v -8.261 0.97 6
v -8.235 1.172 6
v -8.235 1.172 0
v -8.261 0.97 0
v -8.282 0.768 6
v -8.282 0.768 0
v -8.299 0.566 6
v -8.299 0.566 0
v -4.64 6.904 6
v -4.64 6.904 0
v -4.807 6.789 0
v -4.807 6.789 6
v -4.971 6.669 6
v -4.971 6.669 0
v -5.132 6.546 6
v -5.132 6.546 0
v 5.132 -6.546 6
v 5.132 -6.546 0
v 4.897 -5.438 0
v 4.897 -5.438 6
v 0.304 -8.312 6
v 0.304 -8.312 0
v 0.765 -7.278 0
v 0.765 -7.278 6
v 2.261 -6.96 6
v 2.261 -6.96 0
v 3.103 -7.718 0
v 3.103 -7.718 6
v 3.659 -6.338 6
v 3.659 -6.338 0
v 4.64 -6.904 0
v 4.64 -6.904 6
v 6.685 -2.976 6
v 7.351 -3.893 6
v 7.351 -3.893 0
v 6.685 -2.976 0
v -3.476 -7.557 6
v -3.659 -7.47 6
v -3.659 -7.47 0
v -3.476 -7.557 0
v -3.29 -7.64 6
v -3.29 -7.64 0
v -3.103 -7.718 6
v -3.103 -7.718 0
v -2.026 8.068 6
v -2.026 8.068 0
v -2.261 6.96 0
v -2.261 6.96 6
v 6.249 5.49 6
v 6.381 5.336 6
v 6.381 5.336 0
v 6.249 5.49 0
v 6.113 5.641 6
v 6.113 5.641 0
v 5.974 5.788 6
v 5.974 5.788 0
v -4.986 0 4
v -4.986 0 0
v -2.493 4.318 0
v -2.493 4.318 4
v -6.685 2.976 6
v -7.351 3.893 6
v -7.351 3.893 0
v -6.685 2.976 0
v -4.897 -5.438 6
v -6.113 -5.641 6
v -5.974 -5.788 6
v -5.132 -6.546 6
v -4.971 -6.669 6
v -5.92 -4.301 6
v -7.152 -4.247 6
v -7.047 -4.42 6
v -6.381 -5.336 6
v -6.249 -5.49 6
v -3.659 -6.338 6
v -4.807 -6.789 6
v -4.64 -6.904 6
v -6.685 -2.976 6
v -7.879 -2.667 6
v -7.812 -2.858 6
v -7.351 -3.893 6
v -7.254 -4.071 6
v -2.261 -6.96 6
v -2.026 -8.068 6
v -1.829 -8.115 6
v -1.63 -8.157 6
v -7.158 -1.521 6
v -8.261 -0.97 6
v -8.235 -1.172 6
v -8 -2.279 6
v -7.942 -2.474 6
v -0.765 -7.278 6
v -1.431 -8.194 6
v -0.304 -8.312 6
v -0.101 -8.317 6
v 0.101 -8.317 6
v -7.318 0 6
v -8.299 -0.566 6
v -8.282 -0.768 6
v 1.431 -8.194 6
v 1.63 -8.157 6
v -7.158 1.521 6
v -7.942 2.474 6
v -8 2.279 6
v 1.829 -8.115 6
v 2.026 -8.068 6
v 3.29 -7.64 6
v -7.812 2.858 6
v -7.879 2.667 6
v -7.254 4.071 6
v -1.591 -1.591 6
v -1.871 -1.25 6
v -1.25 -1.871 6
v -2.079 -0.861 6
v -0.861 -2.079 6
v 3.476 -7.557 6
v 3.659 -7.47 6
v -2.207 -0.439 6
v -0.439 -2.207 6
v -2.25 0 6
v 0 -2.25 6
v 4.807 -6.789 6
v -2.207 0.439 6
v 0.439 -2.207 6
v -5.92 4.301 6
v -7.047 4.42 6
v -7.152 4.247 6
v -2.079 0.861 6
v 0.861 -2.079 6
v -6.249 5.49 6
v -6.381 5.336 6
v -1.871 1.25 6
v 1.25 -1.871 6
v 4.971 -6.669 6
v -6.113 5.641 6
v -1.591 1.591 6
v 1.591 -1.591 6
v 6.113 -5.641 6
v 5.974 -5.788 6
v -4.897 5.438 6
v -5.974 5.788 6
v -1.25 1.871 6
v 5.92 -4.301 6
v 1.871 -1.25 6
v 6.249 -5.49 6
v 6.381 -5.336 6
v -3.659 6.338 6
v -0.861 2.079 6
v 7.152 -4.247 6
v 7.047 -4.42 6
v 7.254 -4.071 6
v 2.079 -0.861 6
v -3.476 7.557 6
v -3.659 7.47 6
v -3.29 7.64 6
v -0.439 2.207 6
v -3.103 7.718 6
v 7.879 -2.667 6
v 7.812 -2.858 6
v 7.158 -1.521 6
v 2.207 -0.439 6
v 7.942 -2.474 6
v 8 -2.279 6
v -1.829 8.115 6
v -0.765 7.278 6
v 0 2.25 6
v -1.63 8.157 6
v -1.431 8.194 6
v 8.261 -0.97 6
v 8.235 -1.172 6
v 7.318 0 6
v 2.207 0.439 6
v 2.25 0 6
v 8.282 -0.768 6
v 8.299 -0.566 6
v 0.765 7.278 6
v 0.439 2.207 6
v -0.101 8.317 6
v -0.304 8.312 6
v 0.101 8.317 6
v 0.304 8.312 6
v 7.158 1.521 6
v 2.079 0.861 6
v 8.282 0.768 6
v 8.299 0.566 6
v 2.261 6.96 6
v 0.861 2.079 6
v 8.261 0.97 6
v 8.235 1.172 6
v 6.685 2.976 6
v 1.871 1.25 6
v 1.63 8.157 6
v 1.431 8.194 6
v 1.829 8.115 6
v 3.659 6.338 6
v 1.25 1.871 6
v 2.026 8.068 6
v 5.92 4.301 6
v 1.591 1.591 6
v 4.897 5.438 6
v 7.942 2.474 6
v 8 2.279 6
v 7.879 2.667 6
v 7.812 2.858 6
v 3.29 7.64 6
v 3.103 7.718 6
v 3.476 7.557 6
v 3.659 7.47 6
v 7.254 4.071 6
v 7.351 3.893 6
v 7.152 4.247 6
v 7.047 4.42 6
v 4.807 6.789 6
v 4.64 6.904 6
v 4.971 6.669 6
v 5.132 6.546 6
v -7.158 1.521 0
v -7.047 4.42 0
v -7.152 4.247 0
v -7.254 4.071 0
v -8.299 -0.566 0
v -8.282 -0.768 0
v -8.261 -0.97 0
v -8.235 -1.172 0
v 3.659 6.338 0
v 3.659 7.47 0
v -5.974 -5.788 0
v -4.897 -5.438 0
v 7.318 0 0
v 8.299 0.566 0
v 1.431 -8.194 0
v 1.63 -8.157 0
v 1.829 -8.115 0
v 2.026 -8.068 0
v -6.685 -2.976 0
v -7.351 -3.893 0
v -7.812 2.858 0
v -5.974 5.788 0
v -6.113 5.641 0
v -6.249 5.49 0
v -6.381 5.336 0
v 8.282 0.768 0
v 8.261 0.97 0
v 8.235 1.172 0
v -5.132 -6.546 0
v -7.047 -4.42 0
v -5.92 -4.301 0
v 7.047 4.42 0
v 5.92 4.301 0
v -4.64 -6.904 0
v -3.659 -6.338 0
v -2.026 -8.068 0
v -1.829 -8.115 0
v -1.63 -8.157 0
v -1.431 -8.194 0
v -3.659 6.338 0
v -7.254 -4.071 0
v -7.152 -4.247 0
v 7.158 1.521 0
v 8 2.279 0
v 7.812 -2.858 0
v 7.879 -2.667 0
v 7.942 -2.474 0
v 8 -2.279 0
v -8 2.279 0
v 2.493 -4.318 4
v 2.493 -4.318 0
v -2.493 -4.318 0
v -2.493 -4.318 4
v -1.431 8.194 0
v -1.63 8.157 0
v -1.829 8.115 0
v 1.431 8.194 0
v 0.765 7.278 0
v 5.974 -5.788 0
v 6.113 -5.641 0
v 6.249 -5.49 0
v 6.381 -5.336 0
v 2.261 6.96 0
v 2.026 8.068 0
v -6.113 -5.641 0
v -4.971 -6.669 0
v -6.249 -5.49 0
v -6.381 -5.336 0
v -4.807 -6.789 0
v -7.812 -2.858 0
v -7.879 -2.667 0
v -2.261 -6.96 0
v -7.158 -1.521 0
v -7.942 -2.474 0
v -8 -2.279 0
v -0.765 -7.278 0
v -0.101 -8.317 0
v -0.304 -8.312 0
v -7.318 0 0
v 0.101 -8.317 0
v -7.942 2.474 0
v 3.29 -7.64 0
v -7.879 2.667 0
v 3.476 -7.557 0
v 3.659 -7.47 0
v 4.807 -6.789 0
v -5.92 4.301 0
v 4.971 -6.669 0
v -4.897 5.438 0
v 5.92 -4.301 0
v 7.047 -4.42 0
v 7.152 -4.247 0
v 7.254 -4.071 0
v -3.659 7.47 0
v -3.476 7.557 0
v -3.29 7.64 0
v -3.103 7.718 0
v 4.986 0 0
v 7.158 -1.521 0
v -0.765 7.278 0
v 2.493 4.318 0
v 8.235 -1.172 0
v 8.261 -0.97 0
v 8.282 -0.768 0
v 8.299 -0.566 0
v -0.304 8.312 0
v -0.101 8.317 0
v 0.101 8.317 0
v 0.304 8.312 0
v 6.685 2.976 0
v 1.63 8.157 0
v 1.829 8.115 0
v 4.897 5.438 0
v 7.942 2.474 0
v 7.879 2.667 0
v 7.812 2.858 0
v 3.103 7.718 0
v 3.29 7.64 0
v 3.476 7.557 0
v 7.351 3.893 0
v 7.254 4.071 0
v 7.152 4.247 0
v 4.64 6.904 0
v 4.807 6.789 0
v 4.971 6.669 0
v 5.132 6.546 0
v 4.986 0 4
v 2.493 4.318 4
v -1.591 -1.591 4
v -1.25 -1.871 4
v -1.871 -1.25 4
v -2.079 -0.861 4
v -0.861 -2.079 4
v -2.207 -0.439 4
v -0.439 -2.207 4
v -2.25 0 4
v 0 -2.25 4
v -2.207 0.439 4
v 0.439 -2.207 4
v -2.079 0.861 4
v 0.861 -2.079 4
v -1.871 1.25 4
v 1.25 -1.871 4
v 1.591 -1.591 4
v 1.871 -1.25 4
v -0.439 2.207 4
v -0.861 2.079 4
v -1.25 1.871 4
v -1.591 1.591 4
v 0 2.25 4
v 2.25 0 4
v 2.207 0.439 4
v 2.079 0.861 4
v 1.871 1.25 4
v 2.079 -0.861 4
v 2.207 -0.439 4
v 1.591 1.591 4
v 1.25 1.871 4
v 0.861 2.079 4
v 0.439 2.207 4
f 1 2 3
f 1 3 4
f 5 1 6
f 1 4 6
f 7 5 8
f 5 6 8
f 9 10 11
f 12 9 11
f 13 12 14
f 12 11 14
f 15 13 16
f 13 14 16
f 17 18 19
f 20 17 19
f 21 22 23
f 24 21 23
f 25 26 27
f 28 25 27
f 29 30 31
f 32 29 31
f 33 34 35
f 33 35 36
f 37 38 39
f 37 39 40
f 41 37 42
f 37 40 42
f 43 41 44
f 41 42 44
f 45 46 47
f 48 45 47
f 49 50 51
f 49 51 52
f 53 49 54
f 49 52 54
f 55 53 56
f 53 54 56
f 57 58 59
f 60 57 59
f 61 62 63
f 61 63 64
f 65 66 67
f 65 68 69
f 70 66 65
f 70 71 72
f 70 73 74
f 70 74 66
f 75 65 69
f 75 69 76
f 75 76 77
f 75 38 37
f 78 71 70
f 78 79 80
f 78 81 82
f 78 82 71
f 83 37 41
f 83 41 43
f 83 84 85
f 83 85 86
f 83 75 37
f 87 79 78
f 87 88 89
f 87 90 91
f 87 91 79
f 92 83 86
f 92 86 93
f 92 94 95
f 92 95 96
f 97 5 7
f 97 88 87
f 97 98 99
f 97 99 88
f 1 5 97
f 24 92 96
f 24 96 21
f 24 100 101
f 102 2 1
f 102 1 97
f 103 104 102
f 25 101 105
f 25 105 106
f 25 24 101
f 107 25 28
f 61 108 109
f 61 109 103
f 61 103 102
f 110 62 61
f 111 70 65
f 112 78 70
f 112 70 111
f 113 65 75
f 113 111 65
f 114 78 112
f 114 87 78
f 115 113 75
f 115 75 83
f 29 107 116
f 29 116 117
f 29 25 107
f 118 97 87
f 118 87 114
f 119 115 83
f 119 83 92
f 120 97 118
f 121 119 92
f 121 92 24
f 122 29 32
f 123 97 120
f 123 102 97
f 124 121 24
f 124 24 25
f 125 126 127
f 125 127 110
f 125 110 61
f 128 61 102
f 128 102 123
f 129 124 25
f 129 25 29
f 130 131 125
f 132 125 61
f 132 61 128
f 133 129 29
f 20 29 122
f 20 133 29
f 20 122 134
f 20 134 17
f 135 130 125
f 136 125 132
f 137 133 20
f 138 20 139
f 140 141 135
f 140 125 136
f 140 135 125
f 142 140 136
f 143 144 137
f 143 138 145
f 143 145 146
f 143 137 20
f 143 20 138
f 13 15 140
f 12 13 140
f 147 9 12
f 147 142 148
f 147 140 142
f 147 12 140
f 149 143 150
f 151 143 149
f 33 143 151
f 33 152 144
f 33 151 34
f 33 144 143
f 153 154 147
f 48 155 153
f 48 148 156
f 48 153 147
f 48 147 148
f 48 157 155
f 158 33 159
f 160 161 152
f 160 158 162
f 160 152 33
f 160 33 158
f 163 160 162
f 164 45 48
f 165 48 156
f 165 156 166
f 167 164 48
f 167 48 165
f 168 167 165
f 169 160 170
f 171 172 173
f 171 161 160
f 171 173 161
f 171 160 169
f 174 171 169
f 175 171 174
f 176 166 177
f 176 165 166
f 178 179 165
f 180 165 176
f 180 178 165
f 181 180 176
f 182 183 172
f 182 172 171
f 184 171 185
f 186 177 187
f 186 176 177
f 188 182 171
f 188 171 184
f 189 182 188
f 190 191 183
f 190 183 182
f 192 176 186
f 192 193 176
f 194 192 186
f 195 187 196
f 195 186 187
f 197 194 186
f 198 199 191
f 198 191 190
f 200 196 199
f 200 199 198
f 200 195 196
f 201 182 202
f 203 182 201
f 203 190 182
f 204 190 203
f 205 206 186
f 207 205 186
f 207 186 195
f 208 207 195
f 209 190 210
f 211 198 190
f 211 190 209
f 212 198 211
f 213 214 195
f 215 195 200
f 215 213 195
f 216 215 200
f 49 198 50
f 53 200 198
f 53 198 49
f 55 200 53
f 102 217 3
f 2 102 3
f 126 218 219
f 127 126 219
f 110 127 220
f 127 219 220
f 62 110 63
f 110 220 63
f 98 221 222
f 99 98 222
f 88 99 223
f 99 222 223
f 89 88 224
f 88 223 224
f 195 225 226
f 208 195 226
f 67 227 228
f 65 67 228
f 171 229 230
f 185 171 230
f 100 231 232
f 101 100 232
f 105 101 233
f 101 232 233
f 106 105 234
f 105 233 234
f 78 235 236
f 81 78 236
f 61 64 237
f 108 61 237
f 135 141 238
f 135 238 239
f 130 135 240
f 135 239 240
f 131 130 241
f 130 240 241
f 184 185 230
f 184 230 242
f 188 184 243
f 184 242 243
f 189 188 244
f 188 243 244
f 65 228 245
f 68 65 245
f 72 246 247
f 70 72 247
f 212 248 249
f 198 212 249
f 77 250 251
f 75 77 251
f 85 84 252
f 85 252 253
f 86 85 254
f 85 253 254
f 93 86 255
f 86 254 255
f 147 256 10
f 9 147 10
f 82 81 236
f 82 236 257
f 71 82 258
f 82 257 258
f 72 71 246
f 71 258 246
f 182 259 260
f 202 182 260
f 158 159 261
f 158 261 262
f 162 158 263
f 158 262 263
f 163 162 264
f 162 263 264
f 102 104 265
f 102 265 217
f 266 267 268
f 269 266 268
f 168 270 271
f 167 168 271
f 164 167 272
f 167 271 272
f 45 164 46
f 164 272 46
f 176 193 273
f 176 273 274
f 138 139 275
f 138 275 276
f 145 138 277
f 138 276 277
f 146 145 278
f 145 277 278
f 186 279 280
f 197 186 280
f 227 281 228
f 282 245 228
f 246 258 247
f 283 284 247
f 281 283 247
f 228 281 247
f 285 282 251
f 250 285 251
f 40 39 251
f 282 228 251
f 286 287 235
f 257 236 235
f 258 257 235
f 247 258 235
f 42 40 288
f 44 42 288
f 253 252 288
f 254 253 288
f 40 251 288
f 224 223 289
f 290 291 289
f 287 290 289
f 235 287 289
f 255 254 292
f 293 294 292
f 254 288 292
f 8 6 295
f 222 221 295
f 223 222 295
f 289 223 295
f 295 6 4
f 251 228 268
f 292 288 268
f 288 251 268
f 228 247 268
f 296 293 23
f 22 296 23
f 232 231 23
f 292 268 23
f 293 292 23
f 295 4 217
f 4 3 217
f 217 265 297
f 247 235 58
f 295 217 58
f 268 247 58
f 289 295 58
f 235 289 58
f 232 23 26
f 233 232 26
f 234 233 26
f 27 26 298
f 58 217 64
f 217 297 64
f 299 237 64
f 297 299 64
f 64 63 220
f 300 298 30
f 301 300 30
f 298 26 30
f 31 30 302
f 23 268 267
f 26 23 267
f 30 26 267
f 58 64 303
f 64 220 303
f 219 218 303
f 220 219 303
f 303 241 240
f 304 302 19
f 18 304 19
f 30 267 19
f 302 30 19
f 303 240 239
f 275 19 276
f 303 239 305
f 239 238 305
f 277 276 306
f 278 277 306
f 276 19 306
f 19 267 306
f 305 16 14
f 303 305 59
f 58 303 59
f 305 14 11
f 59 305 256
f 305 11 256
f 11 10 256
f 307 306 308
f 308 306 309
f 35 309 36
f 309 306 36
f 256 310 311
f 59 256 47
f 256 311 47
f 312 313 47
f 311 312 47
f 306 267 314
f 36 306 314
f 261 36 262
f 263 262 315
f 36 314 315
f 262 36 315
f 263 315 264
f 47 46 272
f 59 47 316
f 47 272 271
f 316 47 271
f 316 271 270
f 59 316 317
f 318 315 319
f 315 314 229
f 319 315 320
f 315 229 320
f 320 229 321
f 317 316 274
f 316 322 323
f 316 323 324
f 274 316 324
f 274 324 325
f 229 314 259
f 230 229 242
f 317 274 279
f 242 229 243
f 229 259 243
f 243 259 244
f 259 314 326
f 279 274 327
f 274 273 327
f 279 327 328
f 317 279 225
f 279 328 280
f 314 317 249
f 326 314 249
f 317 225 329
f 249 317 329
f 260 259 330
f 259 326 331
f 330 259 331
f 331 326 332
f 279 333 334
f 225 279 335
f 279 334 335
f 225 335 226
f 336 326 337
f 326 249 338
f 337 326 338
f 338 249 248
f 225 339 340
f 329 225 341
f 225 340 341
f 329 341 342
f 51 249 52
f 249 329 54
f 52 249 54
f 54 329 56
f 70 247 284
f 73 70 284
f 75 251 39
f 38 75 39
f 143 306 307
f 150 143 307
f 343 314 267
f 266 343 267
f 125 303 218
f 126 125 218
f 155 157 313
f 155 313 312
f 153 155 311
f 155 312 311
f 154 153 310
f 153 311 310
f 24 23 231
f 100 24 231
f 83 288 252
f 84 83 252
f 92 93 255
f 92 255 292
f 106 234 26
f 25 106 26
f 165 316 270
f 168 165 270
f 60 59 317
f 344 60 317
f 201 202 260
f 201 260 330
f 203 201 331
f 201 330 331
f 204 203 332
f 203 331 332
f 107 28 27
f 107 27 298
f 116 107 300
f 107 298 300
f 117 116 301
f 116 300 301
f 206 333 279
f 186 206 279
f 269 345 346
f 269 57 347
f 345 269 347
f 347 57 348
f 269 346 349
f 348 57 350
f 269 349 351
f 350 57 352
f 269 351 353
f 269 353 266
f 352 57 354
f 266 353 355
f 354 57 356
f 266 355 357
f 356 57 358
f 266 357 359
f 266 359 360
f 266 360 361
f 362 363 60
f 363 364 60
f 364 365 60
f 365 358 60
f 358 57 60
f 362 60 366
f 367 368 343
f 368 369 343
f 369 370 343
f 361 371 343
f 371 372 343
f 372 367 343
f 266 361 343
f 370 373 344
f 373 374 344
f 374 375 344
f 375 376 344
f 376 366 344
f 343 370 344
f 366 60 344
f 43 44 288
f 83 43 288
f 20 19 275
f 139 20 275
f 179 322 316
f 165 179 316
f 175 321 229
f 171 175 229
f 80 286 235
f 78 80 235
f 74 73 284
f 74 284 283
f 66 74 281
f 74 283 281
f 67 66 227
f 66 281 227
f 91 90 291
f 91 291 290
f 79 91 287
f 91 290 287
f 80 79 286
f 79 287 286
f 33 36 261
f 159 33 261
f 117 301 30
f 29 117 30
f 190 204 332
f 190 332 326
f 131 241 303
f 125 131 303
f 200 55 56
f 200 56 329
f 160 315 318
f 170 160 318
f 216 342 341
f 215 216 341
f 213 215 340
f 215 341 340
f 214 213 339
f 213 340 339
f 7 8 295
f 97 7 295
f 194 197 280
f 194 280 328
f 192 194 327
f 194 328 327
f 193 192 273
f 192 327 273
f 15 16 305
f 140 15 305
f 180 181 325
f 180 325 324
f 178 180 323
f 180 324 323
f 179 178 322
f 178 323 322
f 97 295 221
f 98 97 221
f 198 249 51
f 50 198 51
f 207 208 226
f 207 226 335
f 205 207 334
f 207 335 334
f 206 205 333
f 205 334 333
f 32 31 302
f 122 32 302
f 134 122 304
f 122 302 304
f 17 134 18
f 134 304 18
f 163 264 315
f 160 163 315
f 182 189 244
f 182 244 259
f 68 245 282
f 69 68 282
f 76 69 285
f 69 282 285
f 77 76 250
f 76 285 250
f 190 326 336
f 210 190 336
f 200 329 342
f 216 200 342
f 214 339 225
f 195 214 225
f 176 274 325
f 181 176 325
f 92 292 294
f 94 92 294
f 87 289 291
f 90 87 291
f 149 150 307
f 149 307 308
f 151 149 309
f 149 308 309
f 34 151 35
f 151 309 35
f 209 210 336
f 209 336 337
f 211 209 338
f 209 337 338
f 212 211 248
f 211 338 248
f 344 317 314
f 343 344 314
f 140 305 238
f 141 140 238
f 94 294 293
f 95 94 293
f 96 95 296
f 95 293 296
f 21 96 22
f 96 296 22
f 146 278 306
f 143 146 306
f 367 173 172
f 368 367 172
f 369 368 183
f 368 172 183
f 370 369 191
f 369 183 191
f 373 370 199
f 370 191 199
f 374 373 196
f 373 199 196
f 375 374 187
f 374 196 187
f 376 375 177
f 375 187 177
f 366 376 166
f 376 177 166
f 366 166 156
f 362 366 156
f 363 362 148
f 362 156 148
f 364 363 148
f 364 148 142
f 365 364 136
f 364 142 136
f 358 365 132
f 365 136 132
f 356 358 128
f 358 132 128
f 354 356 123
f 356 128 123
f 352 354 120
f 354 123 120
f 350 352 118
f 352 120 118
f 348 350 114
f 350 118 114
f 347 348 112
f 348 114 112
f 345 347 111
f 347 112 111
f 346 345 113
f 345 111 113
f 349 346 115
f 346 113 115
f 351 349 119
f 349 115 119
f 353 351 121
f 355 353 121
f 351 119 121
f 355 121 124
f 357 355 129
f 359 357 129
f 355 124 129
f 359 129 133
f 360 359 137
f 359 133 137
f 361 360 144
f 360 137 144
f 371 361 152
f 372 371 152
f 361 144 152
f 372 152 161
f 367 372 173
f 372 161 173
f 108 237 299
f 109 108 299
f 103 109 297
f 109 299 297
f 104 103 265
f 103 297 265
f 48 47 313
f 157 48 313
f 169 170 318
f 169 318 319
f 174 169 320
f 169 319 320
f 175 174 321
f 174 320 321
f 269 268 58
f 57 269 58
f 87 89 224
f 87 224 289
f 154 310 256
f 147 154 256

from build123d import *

# Parameters (mm, degrees)
F0_R     = 8.318
F1_DEPTH = 6
F2_R     = 2.25
F3_DEPTH = 2
F5_DEPTH = 6
F6_COUNT = 30


with BuildPart() as f1:
    # F0 (on Top) → F1 (new body)
    with BuildSketch(Plane.XY):
        Circle(F0_R)
        Polygon((2.492998, 4.318), (4.985997, 0), (2.492998, -4.318), (-2.492998, -4.318), (-4.985997, 0), (-2.492998, 4.318), align=None, mode=Mode.SUBTRACT)
    extrude(amount=F1_DEPTH)

    # F2 (on face) → F3 (join)
    with BuildSketch(Plane.XY.offset(6)):
        Polygon((-4.985997, 0), (-2.492998, -4.318), (2.492998, -4.318), (4.985997, 0), (2.492998, 4.318), (-2.492998, 4.318), align=None)
        Circle(F2_R, mode=Mode.SUBTRACT)
    extrude(amount=-F3_DEPTH)


with BuildPart() as f5:
    # F4 (on face) → F5 (new body)
    with BuildSketch(Plane(origin=(0, 0, 0), x_dir=(1, 0, 0), z_dir=(0, 0, -1))):
        Polygon((-9.050051, 1), (-9.050051, -1), (-7.318, 0), align=None)
    extrude(amount=-F5_DEPTH)


with BuildPart() as f6_1:
    # F6: instance of F5
    add(f5.part.rotate(Axis((0, 0, 6), (0, 0, 1)), 1 * 360 / F6_COUNT))


with BuildPart() as f6_2:
    # F6: instance of F5
    add(f5.part.rotate(Axis((0, 0, 6), (0, 0, 1)), 2 * 360 / F6_COUNT))


with BuildPart() as f6_3:
    # F6: instance of F5
    add(f5.part.rotate(Axis((0, 0, 6), (0, 0, 1)), 3 * 360 / F6_COUNT))


with BuildPart() as f6_4:
    # F6: instance of F5
    add(f5.part.rotate(Axis((0, 0, 6), (0, 0, 1)), 4 * 360 / F6_COUNT))


with BuildPart() as f6_5:
    # F6: instance of F5
    add(f5.part.rotate(Axis((0, 0, 6), (0, 0, 1)), 5 * 360 / F6_COUNT))


with BuildPart() as f6_6:
    # F6: instance of F5
    add(f5.part.rotate(Axis((0, 0, 6), (0, 0, 1)), 6 * 360 / F6_COUNT))


with BuildPart() as f6_7:
    # F6: instance of F5
    add(f5.part.rotate(Axis((0, 0, 6), (0, 0, 1)), 7 * 360 / F6_COUNT))


with BuildPart() as f6_8:
    # F6: instance of F5
    add(f5.part.rotate(Axis((0, 0, 6), (0, 0, 1)), 8 * 360 / F6_COUNT))


with BuildPart() as f6_9:
    # F6: instance of F5
    add(f5.part.rotate(Axis((0, 0, 6), (0, 0, 1)), 9 * 360 / F6_COUNT))


with BuildPart() as f6_10:
    # F6: instance of F5
    add(f5.part.rotate(Axis((0, 0, 6), (0, 0, 1)), 10 * 360 / F6_COUNT))


with BuildPart() as f6_11:
    # F6: instance of F5
    add(f5.part.rotate(Axis((0, 0, 6), (0, 0, 1)), 11 * 360 / F6_COUNT))


with BuildPart() as f6_12:
    # F6: instance of F5
    add(f5.part.rotate(Axis((0, 0, 6), (0, 0, 1)), 12 * 360 / F6_COUNT))


with BuildPart() as f6_13:
    # F6: instance of F5
    add(f5.part.rotate(Axis((0, 0, 6), (0, 0, 1)), 13 * 360 / F6_COUNT))


with BuildPart() as f6_14:
    # F6: instance of F5
    add(f5.part.rotate(Axis((0, 0, 6), (0, 0, 1)), 14 * 360 / F6_COUNT))


with BuildPart() as f6_15:
    # F6: instance of F5
    add(f5.part.rotate(Axis((0, 0, 6), (0, 0, 1)), 15 * 360 / F6_COUNT))


with BuildPart() as f6_16:
    # F6: instance of F5
    add(f5.part.rotate(Axis((0, 0, 6), (0, 0, 1)), 16 * 360 / F6_COUNT))


with BuildPart() as f6_17:
    # F6: instance of F5
    add(f5.part.rotate(Axis((0, 0, 6), (0, 0, 1)), 17 * 360 / F6_COUNT))


with BuildPart() as f6_18:
    # F6: instance of F5
    add(f5.part.rotate(Axis((0, 0, 6), (0, 0, 1)), 18 * 360 / F6_COUNT))


with BuildPart() as f6_19:
    # F6: instance of F5
    add(f5.part.rotate(Axis((0, 0, 6), (0, 0, 1)), 19 * 360 / F6_COUNT))


with BuildPart() as f6_20:
    # F6: instance of F5
    add(f5.part.rotate(Axis((0, 0, 6), (0, 0, 1)), 20 * 360 / F6_COUNT))


with BuildPart() as f6_21:
    # F6: instance of F5
    add(f5.part.rotate(Axis((0, 0, 6), (0, 0, 1)), 21 * 360 / F6_COUNT))


with BuildPart() as f6_22:
    # F6: instance of F5
    add(f5.part.rotate(Axis((0, 0, 6), (0, 0, 1)), 22 * 360 / F6_COUNT))


with BuildPart() as f6_23:
    # F6: instance of F5
    add(f5.part.rotate(Axis((0, 0, 6), (0, 0, 1)), 23 * 360 / F6_COUNT))


with BuildPart() as f6_24:
    # F6: instance of F5
    add(f5.part.rotate(Axis((0, 0, 6), (0, 0, 1)), 24 * 360 / F6_COUNT))


with BuildPart() as f6_25:
    # F6: instance of F5
    add(f5.part.rotate(Axis((0, 0, 6), (0, 0, 1)), 25 * 360 / F6_COUNT))


with BuildPart() as f6_26:
    # F6: instance of F5
    add(f5.part.rotate(Axis((0, 0, 6), (0, 0, 1)), 26 * 360 / F6_COUNT))


with BuildPart() as f6_27:
    # F6: instance of F5
    add(f5.part.rotate(Axis((0, 0, 6), (0, 0, 1)), 27 * 360 / F6_COUNT))


with BuildPart() as f6_28:
    # F6: instance of F5
    add(f5.part.rotate(Axis((0, 0, 6), (0, 0, 1)), 28 * 360 / F6_COUNT))


with BuildPart() as f6_29:
    # F6: instance of F5
    add(f5.part.rotate(Axis((0, 0, 6), (0, 0, 1)), 29 * 360 / F6_COUNT))


with BuildPart() as f1_1:
    add(f1.part)

    # F7: cut F5, F6_1, F6_2, F6_3, F6_4, F6_5, F6_6, F6_7, F6_8, F6_9, F6_10, F6_11, F6_12, F6_13, F6_14, F6_15, F6_16, F6_17, F6_18, F6_19, F6_20, F6_21, F6_22, F6_23, F6_24, F6_25, F6_26, F6_27, F6_28, F6_29
    add(f5.part, mode=Mode.SUBTRACT)
    add(f6_1.part, mode=Mode.SUBTRACT)
    add(f6_2.part, mode=Mode.SUBTRACT)
    add(f6_3.part, mode=Mode.SUBTRACT)
    add(f6_4.part, mode=Mode.SUBTRACT)
    add(f6_5.part, mode=Mode.SUBTRACT)
    add(f6_6.part, mode=Mode.SUBTRACT)
    add(f6_7.part, mode=Mode.SUBTRACT)
    add(f6_8.part, mode=Mode.SUBTRACT)
    add(f6_9.part, mode=Mode.SUBTRACT)
    add(f6_10.part, mode=Mode.SUBTRACT)
    add(f6_11.part, mode=Mode.SUBTRACT)
    add(f6_12.part, mode=Mode.SUBTRACT)
    add(f6_13.part, mode=Mode.SUBTRACT)
    add(f6_14.part, mode=Mode.SUBTRACT)
    add(f6_15.part, mode=Mode.SUBTRACT)
    add(f6_16.part, mode=Mode.SUBTRACT)
    add(f6_17.part, mode=Mode.SUBTRACT)
    add(f6_18.part, mode=Mode.SUBTRACT)
    add(f6_19.part, mode=Mode.SUBTRACT)
    add(f6_20.part, mode=Mode.SUBTRACT)
    add(f6_21.part, mode=Mode.SUBTRACT)
    add(f6_22.part, mode=Mode.SUBTRACT)
    add(f6_23.part, mode=Mode.SUBTRACT)
    add(f6_24.part, mode=Mode.SUBTRACT)
    add(f6_25.part, mode=Mode.SUBTRACT)
    add(f6_26.part, mode=Mode.SUBTRACT)
    add(f6_27.part, mode=Mode.SUBTRACT)
    add(f6_28.part, mode=Mode.SUBTRACT)
    add(f6_29.part, mode=Mode.SUBTRACT)


solid = f1_1.part
